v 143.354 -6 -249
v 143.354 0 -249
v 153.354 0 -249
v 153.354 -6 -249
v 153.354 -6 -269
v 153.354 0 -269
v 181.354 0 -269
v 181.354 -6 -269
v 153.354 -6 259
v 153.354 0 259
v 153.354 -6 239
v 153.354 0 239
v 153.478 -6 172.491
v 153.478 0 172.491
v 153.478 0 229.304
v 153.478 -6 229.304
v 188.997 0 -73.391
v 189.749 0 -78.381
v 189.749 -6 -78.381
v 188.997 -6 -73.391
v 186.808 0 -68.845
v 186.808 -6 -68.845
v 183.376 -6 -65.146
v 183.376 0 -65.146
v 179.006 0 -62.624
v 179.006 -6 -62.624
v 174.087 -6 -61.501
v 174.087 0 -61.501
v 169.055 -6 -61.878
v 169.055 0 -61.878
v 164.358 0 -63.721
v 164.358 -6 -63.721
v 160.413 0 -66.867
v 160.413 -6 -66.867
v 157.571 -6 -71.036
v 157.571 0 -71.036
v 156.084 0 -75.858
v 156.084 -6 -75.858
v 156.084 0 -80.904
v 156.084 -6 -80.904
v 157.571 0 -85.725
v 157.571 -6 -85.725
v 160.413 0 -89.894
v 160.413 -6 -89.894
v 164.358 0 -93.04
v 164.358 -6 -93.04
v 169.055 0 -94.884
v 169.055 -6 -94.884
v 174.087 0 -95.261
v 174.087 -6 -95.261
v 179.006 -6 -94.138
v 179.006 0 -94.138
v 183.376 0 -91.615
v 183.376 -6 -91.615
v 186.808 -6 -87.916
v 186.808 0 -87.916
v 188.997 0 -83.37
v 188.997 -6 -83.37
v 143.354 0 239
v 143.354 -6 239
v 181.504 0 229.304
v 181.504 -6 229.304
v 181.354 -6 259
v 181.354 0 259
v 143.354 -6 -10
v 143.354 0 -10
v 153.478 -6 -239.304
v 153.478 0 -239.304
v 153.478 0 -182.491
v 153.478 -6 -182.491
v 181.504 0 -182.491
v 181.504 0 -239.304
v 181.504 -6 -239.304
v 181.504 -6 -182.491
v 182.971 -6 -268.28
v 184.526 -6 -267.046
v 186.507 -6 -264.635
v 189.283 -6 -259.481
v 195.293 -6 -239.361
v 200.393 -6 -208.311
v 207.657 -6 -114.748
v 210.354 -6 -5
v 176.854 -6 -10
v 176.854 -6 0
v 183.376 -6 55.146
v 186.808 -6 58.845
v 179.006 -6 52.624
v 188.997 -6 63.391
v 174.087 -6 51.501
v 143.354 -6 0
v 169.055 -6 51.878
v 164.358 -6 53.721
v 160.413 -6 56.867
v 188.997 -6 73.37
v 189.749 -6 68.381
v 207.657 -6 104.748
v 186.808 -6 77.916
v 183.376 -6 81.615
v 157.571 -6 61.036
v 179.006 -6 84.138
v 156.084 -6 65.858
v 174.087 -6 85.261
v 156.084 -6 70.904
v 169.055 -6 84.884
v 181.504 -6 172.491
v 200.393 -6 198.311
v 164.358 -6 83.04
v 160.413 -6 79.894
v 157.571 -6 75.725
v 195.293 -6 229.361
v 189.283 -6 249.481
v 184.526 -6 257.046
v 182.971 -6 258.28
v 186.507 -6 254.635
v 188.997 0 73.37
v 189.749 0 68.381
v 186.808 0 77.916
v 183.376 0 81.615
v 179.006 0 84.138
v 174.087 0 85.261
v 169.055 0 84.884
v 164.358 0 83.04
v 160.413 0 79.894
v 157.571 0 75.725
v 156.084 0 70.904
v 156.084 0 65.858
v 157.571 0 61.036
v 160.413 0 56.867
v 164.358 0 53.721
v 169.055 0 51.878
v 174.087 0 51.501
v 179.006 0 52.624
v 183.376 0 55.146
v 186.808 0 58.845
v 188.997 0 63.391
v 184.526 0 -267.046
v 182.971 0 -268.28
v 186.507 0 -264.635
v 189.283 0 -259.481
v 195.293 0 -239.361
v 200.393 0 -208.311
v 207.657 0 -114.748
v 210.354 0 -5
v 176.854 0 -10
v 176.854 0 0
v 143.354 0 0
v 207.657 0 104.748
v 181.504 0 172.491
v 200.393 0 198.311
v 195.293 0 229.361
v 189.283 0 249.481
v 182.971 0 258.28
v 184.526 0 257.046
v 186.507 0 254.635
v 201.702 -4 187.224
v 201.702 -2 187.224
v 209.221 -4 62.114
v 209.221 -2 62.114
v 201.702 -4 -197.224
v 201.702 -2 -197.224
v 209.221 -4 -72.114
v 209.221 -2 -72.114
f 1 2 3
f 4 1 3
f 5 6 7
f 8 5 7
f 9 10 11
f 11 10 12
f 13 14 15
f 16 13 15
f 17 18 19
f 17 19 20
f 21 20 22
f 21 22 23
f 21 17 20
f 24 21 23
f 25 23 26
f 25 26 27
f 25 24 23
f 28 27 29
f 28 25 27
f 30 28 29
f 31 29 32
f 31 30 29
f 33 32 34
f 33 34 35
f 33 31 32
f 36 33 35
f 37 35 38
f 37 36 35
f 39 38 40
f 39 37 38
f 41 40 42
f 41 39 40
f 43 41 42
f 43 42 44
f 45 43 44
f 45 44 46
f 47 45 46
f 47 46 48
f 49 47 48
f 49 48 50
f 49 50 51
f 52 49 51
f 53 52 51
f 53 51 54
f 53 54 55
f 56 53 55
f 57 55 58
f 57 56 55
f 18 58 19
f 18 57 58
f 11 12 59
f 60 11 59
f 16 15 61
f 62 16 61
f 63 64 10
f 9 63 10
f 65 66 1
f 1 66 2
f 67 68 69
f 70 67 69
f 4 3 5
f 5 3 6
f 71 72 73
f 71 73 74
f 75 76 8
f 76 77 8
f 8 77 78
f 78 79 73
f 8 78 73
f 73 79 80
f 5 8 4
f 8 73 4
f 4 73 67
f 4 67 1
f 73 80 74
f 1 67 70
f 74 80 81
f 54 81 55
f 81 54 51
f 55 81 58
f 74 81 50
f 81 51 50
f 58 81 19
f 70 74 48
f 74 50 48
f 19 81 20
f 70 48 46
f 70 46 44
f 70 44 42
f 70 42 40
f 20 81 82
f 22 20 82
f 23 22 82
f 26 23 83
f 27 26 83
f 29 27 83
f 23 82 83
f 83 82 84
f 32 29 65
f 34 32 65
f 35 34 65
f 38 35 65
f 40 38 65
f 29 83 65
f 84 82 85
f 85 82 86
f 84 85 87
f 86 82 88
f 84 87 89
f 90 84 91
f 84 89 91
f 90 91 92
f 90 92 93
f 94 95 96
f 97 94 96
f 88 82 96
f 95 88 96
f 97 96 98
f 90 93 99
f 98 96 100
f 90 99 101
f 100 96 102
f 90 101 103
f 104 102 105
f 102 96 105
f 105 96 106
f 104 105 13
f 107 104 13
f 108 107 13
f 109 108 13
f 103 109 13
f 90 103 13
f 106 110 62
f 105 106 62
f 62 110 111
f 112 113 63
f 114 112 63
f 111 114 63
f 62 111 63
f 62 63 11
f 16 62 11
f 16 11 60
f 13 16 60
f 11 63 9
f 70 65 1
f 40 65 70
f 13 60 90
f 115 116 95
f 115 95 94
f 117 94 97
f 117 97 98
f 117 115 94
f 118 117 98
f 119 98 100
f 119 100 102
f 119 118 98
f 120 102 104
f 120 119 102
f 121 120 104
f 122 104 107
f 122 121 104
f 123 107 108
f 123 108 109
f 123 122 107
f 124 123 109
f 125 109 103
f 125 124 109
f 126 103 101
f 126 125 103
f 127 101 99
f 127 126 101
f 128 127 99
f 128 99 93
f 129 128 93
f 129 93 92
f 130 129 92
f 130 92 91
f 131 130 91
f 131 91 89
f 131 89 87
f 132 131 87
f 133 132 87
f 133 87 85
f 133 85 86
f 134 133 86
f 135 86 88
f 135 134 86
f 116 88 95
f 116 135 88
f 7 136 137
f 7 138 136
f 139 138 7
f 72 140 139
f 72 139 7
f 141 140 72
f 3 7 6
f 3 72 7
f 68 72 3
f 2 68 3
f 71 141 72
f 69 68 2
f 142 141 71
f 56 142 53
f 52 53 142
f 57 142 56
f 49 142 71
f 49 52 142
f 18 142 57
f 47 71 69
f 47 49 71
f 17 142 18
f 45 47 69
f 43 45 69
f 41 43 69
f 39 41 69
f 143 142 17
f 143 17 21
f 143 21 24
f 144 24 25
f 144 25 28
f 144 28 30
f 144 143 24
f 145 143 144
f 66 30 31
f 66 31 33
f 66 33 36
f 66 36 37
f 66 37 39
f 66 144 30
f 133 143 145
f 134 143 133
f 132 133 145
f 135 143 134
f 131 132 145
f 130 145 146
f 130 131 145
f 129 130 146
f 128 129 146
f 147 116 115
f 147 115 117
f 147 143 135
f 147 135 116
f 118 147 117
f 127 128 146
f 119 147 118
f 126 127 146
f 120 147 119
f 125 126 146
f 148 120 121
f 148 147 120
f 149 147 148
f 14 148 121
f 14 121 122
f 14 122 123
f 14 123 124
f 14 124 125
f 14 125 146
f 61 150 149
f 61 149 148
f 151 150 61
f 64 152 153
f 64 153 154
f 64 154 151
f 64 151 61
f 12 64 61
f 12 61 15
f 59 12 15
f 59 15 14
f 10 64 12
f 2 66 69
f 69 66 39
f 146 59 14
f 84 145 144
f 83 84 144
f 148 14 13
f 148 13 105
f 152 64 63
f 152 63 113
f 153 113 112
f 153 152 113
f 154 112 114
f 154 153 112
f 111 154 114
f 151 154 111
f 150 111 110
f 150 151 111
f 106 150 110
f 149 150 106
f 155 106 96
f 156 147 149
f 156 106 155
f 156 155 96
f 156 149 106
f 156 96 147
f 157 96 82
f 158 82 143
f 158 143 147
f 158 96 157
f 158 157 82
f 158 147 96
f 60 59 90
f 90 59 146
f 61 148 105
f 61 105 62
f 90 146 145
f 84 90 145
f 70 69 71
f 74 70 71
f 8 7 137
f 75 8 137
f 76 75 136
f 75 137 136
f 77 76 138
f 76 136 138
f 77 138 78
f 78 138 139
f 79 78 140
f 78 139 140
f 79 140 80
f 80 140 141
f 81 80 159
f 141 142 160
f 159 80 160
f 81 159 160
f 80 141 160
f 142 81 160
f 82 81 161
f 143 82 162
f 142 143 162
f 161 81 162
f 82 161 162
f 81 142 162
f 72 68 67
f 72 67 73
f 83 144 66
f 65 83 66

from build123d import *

# Parameters (mm, degrees)
F0_R     = 16.9272487263
F0_W     = 28.0263870955
F0_H     = 56.8133033812
F1_DEPTH = 6


# Not quite as in the source:
# - a feature names something its author has since deleted; it is built from what else it names


with BuildPart() as f1:
    # F0 (on Front) → F1 (new body)
    with BuildSketch(Plane.XZ):
        with BuildLine():
            add(Edge.make_bspline(
                [(181.3542903333, 259), (206.5942975175, 252.0158164026), (209.7991991798, 56.7803677557), (210.2653369369, 6.6428164877)],
                knots=[0, 0, 0, 0, 231.86444259, 231.86444259, 231.86444259, 231.86444259], degree=3))
            Line((181.3542903333, 259), (153.3542903333, 259))
            Line((153.3542903333, 259), (153.3542903333, 239))
            Line((153.3542903333, 239), (143.3542903333, 239))
            Line((143.3542903333, 239), (143.3542903333, 0))
            Line((143.3542903333, 0), (176.8542903333, 0))
            Line((176.8542903333, 0), (176.8542903333, -5))
            Line((176.8542903333, -5), (210.3542903333, -5))
            add(Edge.make_bspline(
                [(210.2653369369, 6.6428164877), (210.3331344644, -0.6494527163), (210.3429952934, -4.8722740171), (210.3542903333, -5)],
                knots=[231.86444259, 231.86444259, 231.86444259, 231.86444259, 265.5880268386, 265.5880268386, 265.5880268386, 265.5880268386], degree=3))
        make_face()
        with Locations((172.8220252337, 68.3807536824)):
            Circle(F0_R, mode=Mode.SUBTRACT)
        with Locations((167.491195113, 200.8973438895)):
            Rectangle(F0_W, F0_H, mode=Mode.SUBTRACT)
        with BuildLine():
            add(Edge.make_bspline(
                [(210.2653369369, -16.6428164877), (210.3331344644, -9.3505472837), (210.3429952934, -5.1277259829), (210.3542903333, -5)],
                knots=[231.86444259, 231.86444259, 231.86444259, 231.86444259, 265.5880268386, 265.5880268386, 265.5880268386, 265.5880268386], degree=3))
            Line((210.3542903333, -5), (176.8542903333, -5))
            Line((176.8542903333, -5), (176.8542903333, -10))
            Line((176.8542903333, -10), (143.3542903333, -10))
            Line((143.3542903333, -10), (143.3542903333, -249))
            Line((143.3542903333, -249), (153.3542903333, -249))
            Line((153.3542903333, -249), (153.3542903333, -269))
            Line((153.3542903333, -269), (181.3542903333, -269))
            add(Edge.make_bspline(
                [(181.3542903333, -269), (206.5942975175, -262.0158164026), (209.7991991798, -66.7803677557), (210.2653369369, -16.6428164877)],
                knots=[0, 0, 0, 0, 231.86444259, 231.86444259, 231.86444259, 231.86444259], degree=3))
        make_face()
        with Locations((167.491195113, -210.8973438895)):
            Rectangle(F0_W, F0_H, mode=Mode.SUBTRACT)
        with Locations((172.8220252337, -78.3807536824)):
            Circle(F0_R, mode=Mode.SUBTRACT)
    extrude(amount=F1_DEPTH)


solid = f1.part
